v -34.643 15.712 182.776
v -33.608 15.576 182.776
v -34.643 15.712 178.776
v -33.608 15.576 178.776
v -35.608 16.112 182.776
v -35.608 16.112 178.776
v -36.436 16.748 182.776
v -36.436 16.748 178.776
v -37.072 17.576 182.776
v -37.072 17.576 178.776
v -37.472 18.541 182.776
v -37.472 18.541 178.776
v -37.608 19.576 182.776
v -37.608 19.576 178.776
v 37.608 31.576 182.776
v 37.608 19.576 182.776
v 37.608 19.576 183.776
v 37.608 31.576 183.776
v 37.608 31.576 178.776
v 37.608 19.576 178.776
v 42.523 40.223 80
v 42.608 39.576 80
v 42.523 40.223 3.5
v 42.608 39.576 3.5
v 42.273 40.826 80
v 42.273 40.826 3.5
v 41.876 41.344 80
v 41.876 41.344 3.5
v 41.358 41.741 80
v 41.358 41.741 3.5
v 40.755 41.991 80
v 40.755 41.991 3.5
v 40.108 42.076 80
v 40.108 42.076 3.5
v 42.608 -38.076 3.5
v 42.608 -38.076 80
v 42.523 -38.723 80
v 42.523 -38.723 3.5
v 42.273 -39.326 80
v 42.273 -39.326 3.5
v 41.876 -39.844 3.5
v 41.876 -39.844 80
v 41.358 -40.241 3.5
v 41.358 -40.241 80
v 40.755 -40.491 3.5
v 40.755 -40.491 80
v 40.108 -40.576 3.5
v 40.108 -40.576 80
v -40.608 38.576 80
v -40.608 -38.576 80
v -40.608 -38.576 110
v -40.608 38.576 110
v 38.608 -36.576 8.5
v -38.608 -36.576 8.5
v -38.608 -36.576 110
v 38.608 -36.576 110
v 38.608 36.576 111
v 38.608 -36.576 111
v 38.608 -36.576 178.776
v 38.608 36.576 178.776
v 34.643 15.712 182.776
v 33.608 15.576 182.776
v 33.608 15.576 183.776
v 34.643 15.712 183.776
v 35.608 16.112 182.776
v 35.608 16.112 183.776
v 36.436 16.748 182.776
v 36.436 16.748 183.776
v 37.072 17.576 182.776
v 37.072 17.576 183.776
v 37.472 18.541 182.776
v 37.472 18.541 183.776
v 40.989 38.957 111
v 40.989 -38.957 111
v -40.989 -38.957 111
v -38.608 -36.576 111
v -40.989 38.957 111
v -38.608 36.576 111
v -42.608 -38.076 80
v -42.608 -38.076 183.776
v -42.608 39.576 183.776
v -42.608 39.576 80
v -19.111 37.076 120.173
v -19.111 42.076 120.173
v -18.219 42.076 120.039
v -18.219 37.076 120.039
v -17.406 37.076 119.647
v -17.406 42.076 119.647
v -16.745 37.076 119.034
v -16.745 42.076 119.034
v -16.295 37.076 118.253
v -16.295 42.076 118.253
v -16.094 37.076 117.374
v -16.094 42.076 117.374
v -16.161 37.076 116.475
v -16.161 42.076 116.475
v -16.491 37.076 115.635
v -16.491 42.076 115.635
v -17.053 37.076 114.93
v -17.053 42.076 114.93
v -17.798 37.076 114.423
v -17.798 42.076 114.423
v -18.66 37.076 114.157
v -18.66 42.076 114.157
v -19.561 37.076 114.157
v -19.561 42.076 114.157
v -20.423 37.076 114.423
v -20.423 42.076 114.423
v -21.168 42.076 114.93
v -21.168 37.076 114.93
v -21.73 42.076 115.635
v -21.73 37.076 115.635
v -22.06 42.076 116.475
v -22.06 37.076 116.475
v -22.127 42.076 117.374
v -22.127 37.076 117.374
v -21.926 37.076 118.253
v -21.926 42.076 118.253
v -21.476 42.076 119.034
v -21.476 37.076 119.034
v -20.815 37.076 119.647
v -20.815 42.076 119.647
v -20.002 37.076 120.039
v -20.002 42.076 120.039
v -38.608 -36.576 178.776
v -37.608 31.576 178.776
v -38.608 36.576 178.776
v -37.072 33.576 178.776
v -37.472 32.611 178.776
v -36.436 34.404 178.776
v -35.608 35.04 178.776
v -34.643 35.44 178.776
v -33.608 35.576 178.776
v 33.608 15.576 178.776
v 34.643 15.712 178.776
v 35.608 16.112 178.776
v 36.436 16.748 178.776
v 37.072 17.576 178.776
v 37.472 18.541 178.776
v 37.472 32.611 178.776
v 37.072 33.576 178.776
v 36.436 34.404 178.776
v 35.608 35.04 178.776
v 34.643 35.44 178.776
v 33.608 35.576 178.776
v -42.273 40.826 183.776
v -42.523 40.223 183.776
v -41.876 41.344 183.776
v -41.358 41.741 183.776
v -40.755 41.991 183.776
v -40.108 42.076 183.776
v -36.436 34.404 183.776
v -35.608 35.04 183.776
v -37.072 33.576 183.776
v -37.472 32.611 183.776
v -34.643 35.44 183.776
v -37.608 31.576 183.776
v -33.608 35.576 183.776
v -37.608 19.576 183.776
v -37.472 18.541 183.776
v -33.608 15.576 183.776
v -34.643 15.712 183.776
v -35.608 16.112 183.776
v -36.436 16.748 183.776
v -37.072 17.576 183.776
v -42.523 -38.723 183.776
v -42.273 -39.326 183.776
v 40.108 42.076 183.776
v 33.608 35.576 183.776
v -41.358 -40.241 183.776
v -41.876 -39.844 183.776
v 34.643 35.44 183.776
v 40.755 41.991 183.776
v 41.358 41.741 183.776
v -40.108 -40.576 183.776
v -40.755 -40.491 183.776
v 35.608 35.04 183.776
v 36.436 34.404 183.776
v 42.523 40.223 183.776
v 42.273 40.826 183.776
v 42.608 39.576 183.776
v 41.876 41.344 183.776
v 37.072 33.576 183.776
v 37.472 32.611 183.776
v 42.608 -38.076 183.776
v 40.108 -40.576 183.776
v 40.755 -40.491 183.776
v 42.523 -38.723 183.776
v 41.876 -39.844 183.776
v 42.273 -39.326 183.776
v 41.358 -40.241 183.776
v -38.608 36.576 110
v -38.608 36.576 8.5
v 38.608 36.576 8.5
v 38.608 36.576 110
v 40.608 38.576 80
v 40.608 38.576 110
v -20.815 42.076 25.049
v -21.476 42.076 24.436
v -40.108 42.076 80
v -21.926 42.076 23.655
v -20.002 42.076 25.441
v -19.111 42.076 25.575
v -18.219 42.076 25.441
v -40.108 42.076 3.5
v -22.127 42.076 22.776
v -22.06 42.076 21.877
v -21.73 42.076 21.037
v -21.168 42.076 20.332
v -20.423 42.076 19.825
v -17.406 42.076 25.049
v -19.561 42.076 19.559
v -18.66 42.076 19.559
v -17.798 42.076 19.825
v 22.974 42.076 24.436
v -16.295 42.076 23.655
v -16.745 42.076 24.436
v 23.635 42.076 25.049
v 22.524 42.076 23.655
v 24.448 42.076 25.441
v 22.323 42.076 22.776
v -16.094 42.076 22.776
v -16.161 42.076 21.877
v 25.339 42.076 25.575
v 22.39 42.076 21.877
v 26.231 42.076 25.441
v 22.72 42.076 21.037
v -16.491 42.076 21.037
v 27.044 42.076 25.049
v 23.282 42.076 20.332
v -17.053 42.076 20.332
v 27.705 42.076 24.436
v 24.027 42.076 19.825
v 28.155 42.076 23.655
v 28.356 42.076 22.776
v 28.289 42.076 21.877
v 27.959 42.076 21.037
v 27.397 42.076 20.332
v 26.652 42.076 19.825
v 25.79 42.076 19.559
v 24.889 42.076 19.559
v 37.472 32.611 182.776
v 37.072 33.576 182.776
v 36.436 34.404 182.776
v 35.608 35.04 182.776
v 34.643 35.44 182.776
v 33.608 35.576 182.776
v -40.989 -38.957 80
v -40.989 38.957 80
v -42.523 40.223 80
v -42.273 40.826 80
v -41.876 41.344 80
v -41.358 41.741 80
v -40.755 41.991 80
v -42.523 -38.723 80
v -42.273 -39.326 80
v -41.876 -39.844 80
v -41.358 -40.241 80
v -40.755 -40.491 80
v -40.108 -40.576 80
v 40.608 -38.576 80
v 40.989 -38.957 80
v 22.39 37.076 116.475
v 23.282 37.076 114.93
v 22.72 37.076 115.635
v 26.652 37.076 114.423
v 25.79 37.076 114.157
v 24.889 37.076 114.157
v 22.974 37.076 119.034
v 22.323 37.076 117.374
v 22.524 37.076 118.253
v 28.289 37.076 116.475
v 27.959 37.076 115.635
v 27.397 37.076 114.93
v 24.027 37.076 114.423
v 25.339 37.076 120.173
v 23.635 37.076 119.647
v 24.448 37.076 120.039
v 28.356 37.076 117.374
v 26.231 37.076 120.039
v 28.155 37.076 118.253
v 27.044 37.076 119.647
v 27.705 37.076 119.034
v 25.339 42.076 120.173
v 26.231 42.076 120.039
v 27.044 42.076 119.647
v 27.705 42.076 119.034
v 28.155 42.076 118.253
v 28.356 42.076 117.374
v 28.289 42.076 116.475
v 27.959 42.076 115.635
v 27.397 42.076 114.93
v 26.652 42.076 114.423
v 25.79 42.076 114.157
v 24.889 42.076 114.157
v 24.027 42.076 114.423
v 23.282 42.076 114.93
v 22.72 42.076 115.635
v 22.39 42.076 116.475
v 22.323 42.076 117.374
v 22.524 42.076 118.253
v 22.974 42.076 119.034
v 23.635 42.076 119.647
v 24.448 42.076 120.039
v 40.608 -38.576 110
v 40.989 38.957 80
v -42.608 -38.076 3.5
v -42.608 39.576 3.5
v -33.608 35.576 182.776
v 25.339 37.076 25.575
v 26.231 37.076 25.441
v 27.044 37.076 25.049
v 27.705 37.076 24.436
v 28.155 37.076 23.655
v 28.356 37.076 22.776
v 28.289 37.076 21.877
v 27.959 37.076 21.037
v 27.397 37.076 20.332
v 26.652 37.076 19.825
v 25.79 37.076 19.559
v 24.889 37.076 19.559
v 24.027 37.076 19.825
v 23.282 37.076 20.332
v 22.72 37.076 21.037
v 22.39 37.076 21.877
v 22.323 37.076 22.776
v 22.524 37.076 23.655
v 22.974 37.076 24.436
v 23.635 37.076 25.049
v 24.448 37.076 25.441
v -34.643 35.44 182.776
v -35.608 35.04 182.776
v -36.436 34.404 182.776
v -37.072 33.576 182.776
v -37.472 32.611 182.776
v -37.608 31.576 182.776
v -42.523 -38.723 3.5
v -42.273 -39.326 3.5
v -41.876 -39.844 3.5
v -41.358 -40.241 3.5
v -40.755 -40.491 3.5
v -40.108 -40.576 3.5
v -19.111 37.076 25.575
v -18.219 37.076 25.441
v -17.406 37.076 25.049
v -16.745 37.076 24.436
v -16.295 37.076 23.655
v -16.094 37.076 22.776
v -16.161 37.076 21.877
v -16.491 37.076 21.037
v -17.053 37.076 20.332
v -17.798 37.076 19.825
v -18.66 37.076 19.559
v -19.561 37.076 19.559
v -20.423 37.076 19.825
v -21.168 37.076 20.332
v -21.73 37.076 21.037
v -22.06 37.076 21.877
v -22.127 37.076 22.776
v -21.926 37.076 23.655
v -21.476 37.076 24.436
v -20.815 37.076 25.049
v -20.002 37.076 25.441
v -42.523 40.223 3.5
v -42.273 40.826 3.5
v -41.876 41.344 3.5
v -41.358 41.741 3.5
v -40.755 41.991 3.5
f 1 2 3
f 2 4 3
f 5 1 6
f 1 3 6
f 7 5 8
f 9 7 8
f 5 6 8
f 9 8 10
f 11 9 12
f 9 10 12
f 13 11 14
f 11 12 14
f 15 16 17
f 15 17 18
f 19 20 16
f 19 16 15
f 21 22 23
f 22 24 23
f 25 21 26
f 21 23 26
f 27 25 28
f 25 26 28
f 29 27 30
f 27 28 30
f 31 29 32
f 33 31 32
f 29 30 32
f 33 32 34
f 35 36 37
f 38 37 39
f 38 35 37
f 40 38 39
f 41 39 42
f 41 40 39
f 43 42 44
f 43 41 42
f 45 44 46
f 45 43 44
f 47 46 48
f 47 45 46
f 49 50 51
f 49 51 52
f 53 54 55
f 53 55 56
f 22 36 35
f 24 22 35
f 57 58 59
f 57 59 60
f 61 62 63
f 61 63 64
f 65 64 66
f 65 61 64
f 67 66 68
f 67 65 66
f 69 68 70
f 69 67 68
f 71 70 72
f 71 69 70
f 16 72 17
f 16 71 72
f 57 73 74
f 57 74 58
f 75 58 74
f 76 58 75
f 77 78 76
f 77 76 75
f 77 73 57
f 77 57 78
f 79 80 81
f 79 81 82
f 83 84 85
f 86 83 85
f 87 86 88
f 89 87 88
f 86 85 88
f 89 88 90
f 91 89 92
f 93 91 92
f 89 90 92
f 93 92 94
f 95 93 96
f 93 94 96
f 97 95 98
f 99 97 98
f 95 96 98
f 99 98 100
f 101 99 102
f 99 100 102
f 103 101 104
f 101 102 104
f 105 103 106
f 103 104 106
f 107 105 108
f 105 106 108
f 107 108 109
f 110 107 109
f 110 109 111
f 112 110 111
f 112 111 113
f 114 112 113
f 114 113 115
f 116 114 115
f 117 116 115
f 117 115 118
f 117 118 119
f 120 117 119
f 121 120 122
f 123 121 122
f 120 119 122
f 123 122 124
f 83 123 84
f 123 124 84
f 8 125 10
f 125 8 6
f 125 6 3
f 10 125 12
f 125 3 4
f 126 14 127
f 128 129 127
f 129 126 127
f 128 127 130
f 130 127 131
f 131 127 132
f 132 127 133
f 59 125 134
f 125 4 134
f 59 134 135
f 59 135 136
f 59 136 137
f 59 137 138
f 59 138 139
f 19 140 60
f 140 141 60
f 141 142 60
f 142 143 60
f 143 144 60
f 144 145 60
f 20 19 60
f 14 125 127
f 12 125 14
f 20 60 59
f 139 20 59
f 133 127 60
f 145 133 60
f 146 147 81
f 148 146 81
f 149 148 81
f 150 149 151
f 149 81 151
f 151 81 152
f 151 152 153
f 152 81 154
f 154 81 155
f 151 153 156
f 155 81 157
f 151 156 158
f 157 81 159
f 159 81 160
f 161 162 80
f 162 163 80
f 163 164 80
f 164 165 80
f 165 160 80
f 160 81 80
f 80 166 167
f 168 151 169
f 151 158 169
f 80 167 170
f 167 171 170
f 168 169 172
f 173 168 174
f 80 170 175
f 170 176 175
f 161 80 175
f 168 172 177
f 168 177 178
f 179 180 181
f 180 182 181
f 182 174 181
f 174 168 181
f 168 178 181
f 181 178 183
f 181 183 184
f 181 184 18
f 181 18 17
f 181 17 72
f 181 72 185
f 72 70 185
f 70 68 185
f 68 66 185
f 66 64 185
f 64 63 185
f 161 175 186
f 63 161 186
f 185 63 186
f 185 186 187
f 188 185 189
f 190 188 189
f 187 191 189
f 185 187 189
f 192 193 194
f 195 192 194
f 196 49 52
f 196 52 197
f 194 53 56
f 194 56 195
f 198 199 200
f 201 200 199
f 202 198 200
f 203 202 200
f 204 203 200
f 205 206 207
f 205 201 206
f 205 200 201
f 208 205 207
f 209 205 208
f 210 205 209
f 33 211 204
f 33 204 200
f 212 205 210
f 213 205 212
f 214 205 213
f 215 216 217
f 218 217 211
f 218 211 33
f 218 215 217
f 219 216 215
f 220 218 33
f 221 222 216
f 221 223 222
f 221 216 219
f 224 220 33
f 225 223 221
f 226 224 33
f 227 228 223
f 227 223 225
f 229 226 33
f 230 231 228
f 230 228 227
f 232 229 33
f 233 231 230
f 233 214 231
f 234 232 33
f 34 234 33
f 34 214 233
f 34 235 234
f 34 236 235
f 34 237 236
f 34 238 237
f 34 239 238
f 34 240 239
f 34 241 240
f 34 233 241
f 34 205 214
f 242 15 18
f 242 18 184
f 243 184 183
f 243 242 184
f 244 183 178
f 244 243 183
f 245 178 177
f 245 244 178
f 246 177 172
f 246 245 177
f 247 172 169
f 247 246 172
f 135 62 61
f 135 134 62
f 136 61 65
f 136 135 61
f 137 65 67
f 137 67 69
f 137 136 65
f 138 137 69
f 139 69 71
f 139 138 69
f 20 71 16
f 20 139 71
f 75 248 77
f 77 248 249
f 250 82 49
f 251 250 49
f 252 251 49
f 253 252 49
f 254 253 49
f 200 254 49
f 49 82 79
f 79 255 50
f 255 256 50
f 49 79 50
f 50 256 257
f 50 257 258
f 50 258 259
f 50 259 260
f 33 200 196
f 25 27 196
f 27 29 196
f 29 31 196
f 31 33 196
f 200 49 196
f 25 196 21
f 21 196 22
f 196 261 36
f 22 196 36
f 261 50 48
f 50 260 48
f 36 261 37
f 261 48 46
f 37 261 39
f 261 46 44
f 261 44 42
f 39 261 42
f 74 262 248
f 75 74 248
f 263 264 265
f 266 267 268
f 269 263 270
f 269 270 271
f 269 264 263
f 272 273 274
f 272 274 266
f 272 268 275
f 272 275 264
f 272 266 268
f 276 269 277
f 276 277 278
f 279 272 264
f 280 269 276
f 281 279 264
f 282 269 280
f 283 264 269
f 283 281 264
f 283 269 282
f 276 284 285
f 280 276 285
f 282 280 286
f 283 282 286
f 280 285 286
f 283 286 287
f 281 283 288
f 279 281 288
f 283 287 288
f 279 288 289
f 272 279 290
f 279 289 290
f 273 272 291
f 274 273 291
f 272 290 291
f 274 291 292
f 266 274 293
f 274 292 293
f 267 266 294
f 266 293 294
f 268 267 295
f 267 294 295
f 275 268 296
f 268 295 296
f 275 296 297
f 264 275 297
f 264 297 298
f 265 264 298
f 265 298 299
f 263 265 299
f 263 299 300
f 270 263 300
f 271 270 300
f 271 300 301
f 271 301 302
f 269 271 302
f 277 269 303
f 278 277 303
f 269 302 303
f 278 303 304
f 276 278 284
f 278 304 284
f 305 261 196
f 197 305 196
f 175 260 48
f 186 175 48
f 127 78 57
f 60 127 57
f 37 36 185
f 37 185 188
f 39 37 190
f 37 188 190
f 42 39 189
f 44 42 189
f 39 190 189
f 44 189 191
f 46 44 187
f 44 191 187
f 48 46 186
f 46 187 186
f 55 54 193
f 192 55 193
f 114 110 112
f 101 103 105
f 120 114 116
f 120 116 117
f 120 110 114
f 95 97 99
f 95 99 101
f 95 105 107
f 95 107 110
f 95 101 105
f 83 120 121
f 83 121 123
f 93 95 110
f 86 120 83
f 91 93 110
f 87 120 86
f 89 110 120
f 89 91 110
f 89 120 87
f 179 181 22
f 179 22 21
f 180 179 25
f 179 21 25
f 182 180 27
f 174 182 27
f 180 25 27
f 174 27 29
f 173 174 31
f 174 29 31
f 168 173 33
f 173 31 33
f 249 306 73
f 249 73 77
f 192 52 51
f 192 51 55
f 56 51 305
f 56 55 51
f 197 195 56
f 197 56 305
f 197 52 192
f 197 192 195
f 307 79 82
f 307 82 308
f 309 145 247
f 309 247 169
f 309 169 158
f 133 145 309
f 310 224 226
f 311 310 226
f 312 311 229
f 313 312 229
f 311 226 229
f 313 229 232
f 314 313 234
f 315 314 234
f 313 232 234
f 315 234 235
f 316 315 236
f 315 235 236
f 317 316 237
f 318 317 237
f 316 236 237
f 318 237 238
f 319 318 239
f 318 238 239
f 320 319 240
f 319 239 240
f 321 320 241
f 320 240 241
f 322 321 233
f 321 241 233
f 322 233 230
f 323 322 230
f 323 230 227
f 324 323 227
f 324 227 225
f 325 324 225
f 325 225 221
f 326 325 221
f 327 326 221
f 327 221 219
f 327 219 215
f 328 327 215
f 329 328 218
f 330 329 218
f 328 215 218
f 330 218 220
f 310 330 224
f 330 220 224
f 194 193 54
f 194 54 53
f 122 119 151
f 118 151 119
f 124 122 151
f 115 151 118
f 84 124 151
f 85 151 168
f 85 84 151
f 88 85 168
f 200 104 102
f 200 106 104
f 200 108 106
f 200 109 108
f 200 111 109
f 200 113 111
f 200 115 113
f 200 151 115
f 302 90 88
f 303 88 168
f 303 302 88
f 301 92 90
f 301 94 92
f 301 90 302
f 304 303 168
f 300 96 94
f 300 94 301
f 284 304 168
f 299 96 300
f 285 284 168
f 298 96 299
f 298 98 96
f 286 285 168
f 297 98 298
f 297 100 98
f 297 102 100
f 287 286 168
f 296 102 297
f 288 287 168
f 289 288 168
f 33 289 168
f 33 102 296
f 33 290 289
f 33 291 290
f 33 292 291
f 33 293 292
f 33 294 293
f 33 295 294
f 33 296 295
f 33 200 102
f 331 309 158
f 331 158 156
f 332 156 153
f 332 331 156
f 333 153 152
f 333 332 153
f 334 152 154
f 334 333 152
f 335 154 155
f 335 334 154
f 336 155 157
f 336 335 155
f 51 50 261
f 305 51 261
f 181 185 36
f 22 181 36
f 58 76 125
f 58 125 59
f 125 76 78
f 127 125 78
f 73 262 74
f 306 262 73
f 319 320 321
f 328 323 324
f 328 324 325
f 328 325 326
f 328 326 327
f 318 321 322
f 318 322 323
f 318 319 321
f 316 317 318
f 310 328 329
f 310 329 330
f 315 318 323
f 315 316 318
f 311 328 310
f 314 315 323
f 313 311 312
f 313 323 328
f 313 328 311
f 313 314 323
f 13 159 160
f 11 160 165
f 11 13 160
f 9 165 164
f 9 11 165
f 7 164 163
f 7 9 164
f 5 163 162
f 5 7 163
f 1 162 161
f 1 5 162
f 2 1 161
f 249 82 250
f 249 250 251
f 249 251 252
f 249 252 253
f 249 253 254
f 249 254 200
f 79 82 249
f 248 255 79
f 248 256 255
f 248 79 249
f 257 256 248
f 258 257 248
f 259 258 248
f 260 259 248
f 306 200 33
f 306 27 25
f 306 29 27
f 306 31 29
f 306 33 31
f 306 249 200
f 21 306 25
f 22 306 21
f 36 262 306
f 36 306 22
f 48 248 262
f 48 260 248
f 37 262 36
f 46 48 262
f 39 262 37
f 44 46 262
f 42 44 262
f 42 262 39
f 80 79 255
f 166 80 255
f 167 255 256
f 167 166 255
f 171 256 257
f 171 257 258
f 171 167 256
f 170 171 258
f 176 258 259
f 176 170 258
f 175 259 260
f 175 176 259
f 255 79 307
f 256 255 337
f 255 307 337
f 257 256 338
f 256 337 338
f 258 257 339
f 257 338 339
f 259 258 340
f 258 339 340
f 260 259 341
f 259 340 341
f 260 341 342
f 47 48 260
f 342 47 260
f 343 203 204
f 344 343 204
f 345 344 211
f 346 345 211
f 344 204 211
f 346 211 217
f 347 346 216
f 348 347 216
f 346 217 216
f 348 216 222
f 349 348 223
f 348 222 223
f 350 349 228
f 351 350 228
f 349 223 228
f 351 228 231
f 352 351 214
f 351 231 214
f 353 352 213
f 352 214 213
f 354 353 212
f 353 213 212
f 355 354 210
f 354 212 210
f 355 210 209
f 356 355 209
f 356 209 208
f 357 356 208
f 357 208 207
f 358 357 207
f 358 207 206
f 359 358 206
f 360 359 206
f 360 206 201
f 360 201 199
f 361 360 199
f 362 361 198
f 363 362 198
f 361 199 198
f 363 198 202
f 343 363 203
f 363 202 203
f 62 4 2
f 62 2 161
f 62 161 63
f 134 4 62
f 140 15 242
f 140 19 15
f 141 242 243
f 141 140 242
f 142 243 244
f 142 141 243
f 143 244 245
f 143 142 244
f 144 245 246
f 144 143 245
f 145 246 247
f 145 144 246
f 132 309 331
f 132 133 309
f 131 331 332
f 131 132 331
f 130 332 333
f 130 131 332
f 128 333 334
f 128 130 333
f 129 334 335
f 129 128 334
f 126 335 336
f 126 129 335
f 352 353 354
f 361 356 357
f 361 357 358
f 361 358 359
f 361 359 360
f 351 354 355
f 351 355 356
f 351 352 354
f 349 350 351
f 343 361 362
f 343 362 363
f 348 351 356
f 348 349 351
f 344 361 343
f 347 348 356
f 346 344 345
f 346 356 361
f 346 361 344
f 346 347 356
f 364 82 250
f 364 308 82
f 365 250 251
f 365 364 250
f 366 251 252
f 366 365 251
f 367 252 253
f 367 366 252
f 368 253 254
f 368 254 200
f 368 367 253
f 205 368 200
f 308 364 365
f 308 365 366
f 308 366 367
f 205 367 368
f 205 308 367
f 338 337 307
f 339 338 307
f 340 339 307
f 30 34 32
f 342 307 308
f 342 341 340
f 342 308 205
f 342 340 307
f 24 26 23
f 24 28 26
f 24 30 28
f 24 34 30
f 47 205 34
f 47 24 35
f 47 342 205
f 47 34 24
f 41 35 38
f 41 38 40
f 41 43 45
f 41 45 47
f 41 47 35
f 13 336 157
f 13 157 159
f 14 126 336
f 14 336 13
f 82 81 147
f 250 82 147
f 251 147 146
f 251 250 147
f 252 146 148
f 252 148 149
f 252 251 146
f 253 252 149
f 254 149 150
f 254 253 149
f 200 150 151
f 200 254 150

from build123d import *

# Parameters (mm, degrees)
SKETCH1_W            = 85.216
SKETCH1_H            = 81.152
BOSS_EXTRUDE1_DEPTH  = 182.776
SHELL2_T             = -4
SHELL3_T             = -4
SKETCH4_W            = 81.216
SKETCH4_H            = 77.152
SKETCH4_W_2          = 77.216
SKETCH4_H_2          = 73.152
BOSS_EXTRUDE2_DEPTH  = 30
SKETCH5_W            = 81.978
SKETCH5_H            = 77.914
SKETCH5_W_2          = 77.216
SKETCH5_H_2          = 73.152
CUT_EXTRUDE2_DEPTH   = 31
SKETCH6_W            = 75.216
SKETCH6_H            = 20
CUT_EXTRUDE3_DEPTH   = 4
FILLET3_R            = 4
SKETCH7_W            = 85.216
SKETCH7_H            = 81.152
BOSS_EXTRUDE3_DEPTH  = 4
SKETCH8_W            = 85.216
SKETCH8_H            = 81.152
BOSS_EXTRUDE4_DEPTH  = 4
SKETCH10_W           = 77.216
SKETCH10_H           = 73.152
BOSS_EXTRUDE5_DEPTH  = 4.500000096
SKETCH24_W           = 85.216
SKETCH24_H           = 81.152
CUT_EXTRUDE7_DEPTH   = 7.5
SKETCH25_W           = 85.216
SKETCH25_H           = 81.152
CUT_EXTRUDE8_DEPTH   = 3
SKETCH27_W           = 85.216
SKETCH27_H           = 103.776
BOSS_EXTRUDE15_DEPTH = 1.5
SKETCH28_W           = 85.216
SKETCH28_H           = 76.5
BOSS_EXTRUDE16_DEPTH = 1.5
FILLET4_R            = 2.5
FILLET5_R            = 2.5
SKETCH29_R           = 3.025
CUT_EXTRUDE9_DEPTH   = 5


with BuildPart() as part:
    # Sketch1 → Boss-Extrude1 (new body)
    with BuildSketch(Plane.XY):
        Rectangle(SKETCH1_W, SKETCH1_H)
    extrude(amount=BOSS_EXTRUDE1_DEPTH)


with BuildPart() as body_2:
    # Split1: the piece on the far side of the plane
    add(part.part)
    split(bisect_by=Plane(origin=(0, 0, 80), x_dir=(-1, 0, 0), z_dir=(0, 0, -1)), keep=Keep.BOTTOM)

    # Shell3
    shell3_openings = [body_2.faces().sort_by_distance(p)[0] for p in [
        (0, 0, 80),
    ]]
    offset(amount=SHELL3_T, openings=shell3_openings, kind=Kind.INTERSECTION)

    # Sketch5 → Cut-Extrude2 (cut)
    with BuildSketch(Plane(origin=(0, 0, 80), x_dir=(-1, 0, 0), z_dir=(0, 0, -1))):
        Rectangle(SKETCH5_W, SKETCH5_H)
        Rectangle(SKETCH5_W_2, SKETCH5_H_2, mode=Mode.SUBTRACT)
    extrude(amount=-CUT_EXTRUDE2_DEPTH, mode=Mode.SUBTRACT)

    # Sketch6 → Cut-Extrude3 (cut)
    with BuildSketch(Plane.XY.offset(182.776)):
        with Locations((0, 25.576)):
            Rectangle(SKETCH6_W, SKETCH6_H)
    extrude(amount=-CUT_EXTRUDE3_DEPTH, mode=Mode.SUBTRACT)

    # Fillet3
    fillet3_edges = [body_2.edges().sort_by_distance(p)[0] for p in [
        (37.608, 35.576, 180.776),
        (37.608, 15.576, 180.776),
        (-37.608, 15.576, 180.776),
        (-37.608, 35.576, 180.776),
    ]]
    fillet(fillet3_edges, radius=FILLET3_R)

    # Sketch7 → Boss-Extrude3 (add)
    with BuildSketch(Plane.XY.offset(182.776)):
        Rectangle(SKETCH7_W, SKETCH7_H)
        with BuildLine():
            Line((-33.608, 15.576), (33.608, 15.576))
            ThreePointArc((33.608, 15.576), (36.436427125, 16.747572875), (37.608, 19.576))
            Line((37.608, 19.576), (37.608, 31.576))
            ThreePointArc((37.608, 31.576), (36.436427125, 34.404427125), (33.608, 35.576))
            Line((33.608, 35.576), (-33.608, 35.576))
            ThreePointArc((-33.608, 35.576), (-36.436427125, 34.404427125), (-37.608, 31.576))
            Line((-37.608, 31.576), (-37.608, 19.576))
            ThreePointArc((-37.608, 19.576), (-36.436427125, 16.747572875), (-33.608, 15.576))
        make_face(mode=Mode.SUBTRACT)
    extrude(amount=BOSS_EXTRUDE3_DEPTH)

    # Sketch25 → Cut-Extrude8 (cut)
    with BuildSketch(Plane.XY.offset(186.776)):
        Rectangle(SKETCH25_W, SKETCH25_H)
    extrude(amount=-CUT_EXTRUDE8_DEPTH, mode=Mode.SUBTRACT)

    # Sketch27 → Boss-Extrude15 (add)
    with BuildSketch(Plane(origin=(0, 40.576, 0), x_dir=(1, 0, 0), z_dir=(0, 1, 0))):
        with Locations((0, -131.888)):
            Rectangle(SKETCH27_W, SKETCH27_H)
    extrude(amount=BOSS_EXTRUDE15_DEPTH)

    # Fillet4
    fillet4_edges = [body_2.edges().sort_by_distance(p)[0] for p in [
        (42.608, -40.576, 131.888),
        (-42.608, -40.576, 131.888),
        (-42.608, 42.076, 131.888),
        (42.608, 42.076, 131.888),
    ]]
    fillet(fillet4_edges, radius=FILLET4_R)


with BuildPart() as part_1:
    add(part.part)

    # Split1
    split(bisect_by=Plane(origin=(0, 0, 80), x_dir=(-1, 0, 0), z_dir=(0, 0, -1)), keep=Keep.TOP)

    # Shell2
    shell2_openings = [part_1.faces().sort_by_distance(p)[0] for p in [
        (0, 0, 80),
    ]]
    offset(amount=SHELL2_T, openings=shell2_openings, kind=Kind.INTERSECTION)

    # Sketch4 → Boss-Extrude2 (add)
    with BuildSketch(Plane.XY.offset(80)):
        Rectangle(SKETCH4_W, SKETCH4_H)
        Rectangle(SKETCH4_W_2, SKETCH4_H_2, mode=Mode.SUBTRACT)
    extrude(amount=BOSS_EXTRUDE2_DEPTH)

    # Sketch8 → Boss-Extrude4 (add)
    with BuildSketch(Plane(origin=(0, 0, 0), x_dir=(-1, 0, 0), z_dir=(0, 0, -1))):
        Rectangle(SKETCH8_W, SKETCH8_H)
    extrude(amount=BOSS_EXTRUDE4_DEPTH)

    # Sketch10 → Boss-Extrude5 (add)
    with BuildSketch(Plane.XY.offset(4)):
        Rectangle(SKETCH10_W, SKETCH10_H)
    extrude(amount=BOSS_EXTRUDE5_DEPTH)

    # Sketch24 → Cut-Extrude7 (cut)
    with BuildSketch(Plane(origin=(0, 0, -4), x_dir=(-1, 0, 0), z_dir=(0, 0, -1))):
        Rectangle(SKETCH24_W, SKETCH24_H)
    extrude(amount=-CUT_EXTRUDE7_DEPTH, mode=Mode.SUBTRACT)

    # Sketch28 → Boss-Extrude16 (add)
    with BuildSketch(Plane(origin=(0, 40.576, 0), x_dir=(1, 0, 0), z_dir=(0, 1, 0))):
        with Locations((0, -41.75)):
            Rectangle(SKETCH28_W, SKETCH28_H)
    extrude(amount=BOSS_EXTRUDE16_DEPTH)

    # Fillet5
    fillet5_edges = [part_1.edges().sort_by_distance(p)[0] for p in [
        (42.608, 42.076, 41.75),
        (-42.608, 42.076, 41.75),
        (42.608, -40.576, 41.75),
        (-42.608, -40.576, 41.75),
    ]]
    fillet(fillet5_edges, radius=FILLET5_R)


with BuildPart() as cut_extrude9_tool:
    # Sketch29 → Cut-Extrude9 (new body)
    with BuildSketch(Plane(origin=(0, 42.076, 0), x_dir=(1, 0, 0), z_dir=(0, 1, 0))):
        with Locations(Location((25.339474403, -117.147952381, 0), (0, 0, 270))):
            Circle(SKETCH29_R)
        with Locations(Location((-19.110525597, -117.147952381, 0), (0, 0, 270))):
            Circle(SKETCH29_R)
        with Locations(Location((-19.110525597, -22.549952381, 0), (0, 0, 270))):
            Circle(SKETCH29_R)
        with Locations(Location((25.339474403, -22.549952381, 0), (0, 0, 270))):
            Circle(SKETCH29_R)
    extrude(amount=-CUT_EXTRUDE9_DEPTH)


with BuildPart() as part_2:
    add(part_1.part)

    # Cut-Extrude9: cut by cut_extrude9_tool
    add(cut_extrude9_tool.part, mode=Mode.SUBTRACT)


with BuildPart() as body_2_1:
    add(body_2.part)

    # Cut-Extrude9: cut by cut_extrude9_tool
    add(cut_extrude9_tool.part, mode=Mode.SUBTRACT)


solid = Compound([part_2.part, body_2_1.part])
